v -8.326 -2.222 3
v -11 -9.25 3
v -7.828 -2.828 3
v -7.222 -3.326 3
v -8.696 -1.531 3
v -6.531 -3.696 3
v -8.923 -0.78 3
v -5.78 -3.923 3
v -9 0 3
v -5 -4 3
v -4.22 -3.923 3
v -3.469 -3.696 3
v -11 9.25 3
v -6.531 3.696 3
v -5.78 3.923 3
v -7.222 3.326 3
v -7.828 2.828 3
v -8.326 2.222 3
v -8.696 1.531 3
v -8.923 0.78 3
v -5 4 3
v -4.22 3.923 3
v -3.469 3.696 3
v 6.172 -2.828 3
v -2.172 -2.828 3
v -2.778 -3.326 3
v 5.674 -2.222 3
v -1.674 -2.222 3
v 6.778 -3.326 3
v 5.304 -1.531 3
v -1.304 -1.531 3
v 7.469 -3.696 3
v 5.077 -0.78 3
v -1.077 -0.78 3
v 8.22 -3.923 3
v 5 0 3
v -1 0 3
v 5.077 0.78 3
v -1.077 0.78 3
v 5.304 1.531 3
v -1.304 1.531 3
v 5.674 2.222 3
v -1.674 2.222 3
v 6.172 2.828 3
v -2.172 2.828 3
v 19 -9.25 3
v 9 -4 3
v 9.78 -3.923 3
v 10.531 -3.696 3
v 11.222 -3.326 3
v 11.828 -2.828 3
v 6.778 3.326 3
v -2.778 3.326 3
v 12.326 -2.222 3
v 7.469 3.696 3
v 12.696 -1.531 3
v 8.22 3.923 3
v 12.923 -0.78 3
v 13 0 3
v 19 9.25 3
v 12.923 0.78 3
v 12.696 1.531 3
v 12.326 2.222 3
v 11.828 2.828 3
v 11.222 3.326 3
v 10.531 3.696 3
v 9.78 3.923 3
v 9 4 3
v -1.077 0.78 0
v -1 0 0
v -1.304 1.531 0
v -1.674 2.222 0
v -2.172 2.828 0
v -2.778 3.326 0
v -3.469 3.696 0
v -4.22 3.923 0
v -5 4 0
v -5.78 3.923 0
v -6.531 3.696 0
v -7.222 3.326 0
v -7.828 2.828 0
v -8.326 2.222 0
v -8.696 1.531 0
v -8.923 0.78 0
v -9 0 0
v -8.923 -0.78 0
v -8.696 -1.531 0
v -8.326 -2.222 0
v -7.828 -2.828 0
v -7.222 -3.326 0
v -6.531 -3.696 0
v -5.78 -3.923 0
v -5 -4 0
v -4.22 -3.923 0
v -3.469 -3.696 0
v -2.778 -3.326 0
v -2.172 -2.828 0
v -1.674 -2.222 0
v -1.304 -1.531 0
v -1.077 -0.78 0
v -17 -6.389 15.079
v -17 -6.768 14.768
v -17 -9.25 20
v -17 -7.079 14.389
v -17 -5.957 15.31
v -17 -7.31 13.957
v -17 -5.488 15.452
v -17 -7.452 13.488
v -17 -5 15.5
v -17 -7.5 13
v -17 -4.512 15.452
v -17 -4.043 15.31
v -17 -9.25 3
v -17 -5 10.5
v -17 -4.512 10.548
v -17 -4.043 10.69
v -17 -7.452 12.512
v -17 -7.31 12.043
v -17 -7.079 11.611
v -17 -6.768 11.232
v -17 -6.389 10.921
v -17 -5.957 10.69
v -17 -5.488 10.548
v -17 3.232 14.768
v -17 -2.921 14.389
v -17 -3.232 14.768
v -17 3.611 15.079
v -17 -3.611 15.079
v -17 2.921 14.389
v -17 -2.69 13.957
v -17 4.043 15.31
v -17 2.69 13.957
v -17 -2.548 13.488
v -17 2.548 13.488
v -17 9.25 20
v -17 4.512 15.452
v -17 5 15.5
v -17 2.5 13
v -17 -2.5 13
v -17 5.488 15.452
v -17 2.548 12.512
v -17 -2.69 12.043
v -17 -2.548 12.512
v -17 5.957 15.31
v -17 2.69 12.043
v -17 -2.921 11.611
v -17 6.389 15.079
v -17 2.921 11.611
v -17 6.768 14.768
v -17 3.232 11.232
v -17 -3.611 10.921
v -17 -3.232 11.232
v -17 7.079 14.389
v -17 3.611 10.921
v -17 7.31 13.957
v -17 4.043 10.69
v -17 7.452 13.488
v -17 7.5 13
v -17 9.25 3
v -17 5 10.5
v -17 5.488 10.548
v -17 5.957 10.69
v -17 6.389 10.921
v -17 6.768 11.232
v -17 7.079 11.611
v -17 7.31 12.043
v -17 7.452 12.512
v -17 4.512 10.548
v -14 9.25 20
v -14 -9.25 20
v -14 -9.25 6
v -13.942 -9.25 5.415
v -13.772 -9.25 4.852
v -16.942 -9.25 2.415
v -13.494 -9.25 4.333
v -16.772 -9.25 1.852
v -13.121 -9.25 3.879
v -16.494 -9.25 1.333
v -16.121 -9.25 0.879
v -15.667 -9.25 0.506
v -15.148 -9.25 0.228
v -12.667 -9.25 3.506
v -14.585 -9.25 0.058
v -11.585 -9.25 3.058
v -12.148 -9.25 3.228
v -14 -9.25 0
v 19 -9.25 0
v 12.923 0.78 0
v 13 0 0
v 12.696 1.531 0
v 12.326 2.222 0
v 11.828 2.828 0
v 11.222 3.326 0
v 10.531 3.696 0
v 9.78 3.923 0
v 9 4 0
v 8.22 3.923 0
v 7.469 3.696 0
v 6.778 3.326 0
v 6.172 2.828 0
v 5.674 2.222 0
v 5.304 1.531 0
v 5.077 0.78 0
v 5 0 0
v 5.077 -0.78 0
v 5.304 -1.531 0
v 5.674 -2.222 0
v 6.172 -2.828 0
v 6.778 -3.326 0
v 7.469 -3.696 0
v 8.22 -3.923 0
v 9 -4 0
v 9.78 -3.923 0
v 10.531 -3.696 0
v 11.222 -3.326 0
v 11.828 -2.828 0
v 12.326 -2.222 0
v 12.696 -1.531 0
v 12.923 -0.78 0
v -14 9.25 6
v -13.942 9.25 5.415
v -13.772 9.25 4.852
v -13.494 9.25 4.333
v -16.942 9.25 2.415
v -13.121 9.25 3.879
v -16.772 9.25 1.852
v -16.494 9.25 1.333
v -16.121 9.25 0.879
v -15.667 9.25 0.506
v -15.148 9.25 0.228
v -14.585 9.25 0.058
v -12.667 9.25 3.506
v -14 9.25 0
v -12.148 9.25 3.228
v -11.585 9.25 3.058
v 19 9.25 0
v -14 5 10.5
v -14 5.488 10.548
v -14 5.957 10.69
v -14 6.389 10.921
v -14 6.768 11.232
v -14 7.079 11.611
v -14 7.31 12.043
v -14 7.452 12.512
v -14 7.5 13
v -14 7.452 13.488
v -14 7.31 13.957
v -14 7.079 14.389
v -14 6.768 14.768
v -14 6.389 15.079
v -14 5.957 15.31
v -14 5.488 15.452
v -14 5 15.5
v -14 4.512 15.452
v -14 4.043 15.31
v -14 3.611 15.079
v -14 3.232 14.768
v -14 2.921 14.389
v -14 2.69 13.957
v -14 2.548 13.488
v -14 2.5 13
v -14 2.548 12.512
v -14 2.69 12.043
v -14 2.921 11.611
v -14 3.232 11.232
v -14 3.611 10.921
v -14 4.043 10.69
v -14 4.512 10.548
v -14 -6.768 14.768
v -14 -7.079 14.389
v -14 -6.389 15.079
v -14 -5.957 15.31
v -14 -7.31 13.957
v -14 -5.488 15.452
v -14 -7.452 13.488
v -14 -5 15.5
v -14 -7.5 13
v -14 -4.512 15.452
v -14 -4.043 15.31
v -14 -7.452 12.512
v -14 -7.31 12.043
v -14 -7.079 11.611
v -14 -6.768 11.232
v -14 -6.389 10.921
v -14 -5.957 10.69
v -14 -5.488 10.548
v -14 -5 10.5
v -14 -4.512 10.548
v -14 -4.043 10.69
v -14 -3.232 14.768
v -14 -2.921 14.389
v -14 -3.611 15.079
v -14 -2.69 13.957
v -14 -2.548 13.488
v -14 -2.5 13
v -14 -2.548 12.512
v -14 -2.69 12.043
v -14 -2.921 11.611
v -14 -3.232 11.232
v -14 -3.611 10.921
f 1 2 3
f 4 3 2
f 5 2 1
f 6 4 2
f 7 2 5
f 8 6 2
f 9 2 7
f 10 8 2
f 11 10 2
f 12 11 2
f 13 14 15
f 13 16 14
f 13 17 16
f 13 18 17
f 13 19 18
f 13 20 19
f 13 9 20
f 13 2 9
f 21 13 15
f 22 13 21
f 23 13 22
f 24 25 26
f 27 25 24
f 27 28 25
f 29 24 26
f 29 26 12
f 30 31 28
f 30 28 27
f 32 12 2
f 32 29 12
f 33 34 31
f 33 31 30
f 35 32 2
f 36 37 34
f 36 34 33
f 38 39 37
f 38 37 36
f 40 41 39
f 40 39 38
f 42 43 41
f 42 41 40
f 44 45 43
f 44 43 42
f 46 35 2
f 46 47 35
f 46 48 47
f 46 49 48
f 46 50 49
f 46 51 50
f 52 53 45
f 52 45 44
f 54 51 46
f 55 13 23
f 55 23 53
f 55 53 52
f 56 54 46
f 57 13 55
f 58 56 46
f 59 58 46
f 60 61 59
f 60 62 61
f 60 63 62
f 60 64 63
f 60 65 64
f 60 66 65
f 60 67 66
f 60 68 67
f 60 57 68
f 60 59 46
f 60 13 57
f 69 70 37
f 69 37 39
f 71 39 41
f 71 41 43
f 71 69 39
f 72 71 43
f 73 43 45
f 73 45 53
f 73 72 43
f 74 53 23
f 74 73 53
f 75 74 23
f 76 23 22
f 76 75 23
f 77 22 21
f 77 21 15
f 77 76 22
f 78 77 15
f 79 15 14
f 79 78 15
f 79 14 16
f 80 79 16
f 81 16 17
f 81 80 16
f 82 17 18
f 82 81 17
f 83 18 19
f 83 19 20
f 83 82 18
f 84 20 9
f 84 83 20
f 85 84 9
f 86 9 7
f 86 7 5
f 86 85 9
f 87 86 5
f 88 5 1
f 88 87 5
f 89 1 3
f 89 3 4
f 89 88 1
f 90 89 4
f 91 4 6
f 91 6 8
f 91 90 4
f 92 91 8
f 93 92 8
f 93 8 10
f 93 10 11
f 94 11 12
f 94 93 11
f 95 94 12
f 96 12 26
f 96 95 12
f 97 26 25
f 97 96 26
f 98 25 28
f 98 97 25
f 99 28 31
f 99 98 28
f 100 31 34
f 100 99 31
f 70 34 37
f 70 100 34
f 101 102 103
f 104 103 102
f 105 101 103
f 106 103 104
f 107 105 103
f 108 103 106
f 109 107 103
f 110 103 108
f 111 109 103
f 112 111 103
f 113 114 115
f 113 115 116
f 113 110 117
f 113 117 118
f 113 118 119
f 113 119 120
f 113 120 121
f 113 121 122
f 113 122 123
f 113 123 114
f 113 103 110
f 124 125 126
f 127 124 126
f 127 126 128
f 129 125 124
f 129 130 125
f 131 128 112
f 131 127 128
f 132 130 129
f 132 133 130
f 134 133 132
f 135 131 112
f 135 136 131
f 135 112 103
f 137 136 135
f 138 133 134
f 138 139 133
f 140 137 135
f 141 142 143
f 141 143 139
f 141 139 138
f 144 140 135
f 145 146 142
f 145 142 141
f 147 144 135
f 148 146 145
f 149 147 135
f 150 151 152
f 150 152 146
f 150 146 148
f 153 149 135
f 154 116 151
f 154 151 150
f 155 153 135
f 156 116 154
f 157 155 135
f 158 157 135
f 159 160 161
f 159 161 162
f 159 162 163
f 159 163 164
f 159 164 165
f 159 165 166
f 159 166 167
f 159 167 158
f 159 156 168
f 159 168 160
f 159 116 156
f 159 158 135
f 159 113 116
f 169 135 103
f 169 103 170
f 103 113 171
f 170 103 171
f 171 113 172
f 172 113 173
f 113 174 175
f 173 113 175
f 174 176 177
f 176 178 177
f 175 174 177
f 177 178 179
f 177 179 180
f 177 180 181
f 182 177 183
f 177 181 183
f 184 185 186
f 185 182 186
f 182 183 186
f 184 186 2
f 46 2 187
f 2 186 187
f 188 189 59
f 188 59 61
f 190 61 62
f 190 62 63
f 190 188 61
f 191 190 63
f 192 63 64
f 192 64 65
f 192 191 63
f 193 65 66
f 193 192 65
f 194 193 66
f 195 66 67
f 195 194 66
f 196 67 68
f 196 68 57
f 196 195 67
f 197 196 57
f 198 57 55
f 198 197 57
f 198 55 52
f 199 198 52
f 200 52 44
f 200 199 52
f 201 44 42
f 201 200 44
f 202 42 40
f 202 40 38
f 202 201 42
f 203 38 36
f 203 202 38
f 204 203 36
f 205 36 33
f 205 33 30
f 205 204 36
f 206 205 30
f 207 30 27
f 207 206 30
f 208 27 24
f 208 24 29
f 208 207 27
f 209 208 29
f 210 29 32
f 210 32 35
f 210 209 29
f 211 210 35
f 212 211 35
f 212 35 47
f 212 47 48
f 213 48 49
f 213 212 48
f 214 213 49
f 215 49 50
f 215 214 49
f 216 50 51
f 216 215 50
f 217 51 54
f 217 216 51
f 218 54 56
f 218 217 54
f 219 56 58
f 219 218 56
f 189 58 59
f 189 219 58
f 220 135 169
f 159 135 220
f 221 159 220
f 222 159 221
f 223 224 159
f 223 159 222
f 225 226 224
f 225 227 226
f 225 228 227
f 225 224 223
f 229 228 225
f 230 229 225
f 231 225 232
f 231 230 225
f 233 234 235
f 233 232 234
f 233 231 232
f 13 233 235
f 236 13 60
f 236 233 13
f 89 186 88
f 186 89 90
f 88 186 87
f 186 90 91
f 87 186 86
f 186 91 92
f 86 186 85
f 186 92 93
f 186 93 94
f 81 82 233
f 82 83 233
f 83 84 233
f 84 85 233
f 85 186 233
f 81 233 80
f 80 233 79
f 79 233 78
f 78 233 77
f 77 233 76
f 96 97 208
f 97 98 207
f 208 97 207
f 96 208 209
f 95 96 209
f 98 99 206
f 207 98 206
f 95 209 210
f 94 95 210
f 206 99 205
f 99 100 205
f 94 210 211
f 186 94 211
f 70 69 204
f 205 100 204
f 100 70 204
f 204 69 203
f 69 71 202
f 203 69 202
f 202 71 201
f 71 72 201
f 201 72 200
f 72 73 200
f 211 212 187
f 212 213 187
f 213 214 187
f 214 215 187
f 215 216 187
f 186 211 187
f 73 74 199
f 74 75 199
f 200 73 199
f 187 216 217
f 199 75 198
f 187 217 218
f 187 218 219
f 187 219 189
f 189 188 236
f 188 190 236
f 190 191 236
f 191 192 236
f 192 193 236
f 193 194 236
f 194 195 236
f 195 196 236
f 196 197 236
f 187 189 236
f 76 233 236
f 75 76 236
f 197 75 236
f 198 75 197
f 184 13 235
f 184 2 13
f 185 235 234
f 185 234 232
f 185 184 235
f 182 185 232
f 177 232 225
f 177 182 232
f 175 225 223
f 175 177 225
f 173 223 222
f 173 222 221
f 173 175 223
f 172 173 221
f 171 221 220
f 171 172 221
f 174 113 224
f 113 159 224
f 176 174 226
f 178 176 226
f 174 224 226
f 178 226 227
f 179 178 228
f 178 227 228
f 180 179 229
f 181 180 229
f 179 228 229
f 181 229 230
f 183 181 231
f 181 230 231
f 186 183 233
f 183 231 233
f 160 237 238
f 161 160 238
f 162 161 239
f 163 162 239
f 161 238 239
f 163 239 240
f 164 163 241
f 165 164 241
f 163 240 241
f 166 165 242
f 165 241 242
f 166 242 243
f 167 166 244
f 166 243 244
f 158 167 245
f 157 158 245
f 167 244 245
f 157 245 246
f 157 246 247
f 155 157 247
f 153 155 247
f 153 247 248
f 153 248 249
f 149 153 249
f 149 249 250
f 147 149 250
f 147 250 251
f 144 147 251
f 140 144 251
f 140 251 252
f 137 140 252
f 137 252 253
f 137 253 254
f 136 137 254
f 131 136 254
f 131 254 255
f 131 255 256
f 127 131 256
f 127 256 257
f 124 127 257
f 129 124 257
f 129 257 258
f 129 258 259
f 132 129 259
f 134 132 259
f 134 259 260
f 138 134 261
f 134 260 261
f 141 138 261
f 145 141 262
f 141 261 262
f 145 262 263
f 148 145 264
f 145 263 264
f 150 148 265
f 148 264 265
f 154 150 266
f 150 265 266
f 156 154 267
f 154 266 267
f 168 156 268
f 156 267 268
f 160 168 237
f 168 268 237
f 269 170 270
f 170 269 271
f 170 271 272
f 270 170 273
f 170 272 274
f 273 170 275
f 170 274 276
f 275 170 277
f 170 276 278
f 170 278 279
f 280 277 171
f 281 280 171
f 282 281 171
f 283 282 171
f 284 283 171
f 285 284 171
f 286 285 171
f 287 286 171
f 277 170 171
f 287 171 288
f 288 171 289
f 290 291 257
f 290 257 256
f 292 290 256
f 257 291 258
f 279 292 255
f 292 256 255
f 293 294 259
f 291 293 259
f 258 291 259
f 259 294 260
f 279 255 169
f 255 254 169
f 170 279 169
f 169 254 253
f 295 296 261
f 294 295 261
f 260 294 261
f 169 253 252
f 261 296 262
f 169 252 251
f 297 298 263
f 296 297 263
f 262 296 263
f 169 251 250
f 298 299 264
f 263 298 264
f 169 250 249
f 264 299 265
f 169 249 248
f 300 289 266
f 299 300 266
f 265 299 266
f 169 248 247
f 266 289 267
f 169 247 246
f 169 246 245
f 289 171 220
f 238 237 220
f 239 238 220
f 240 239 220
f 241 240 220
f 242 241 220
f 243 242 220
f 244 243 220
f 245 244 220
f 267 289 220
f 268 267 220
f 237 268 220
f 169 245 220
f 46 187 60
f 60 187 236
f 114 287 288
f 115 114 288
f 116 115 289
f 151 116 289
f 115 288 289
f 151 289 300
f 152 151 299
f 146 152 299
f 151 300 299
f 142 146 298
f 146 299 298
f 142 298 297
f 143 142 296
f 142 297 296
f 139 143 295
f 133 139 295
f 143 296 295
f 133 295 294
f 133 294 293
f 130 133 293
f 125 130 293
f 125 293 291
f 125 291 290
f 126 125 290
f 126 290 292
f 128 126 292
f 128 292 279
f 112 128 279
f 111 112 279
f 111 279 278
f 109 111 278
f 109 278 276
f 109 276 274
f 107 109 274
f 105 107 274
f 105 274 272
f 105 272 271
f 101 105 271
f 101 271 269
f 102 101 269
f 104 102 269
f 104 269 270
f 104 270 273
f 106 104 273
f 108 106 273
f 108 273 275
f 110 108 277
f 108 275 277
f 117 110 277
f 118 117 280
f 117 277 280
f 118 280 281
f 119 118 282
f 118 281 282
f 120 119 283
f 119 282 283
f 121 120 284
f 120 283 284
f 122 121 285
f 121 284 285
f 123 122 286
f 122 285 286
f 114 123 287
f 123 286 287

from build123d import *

# Parameters (mm, degrees)
SKETCH1_W           = 36
SKETCH1_H           = 18.5
SKETCH1_R           = 4
BOSS_EXTRUDE1_DEPTH = 3
SKETCH1_3_W         = 3
SKETCH1_3_H         = 18.5
BOSS_EXTRUDE2_DEPTH = 20
FILLET1_R           = 3
SKETCH2_R           = 2.5
CUT_EXTRUDE1_DEPTH  = 40.680757301


with BuildPart() as part:
    # Sketch1 → Boss-Extrude1 (new body)
    with BuildSketch(Plane.XY):
        with Locations((1, 0)):
            Rectangle(SKETCH1_W, SKETCH1_H)
        with Locations((9, 0)):
            Circle(SKETCH1_R, mode=Mode.SUBTRACT)
        with Locations((-5, 0)):
            Circle(SKETCH1_R, mode=Mode.SUBTRACT)
    extrude(amount=BOSS_EXTRUDE1_DEPTH)

    # Sketch1<3> → Boss-Extrude2 (add)
    with BuildSketch(Plane.XY):
        with Locations((-15.5, 0)):
            Rectangle(SKETCH1_3_W, SKETCH1_3_H)
    extrude(amount=BOSS_EXTRUDE2_DEPTH)

    # Fillet1
    fillet1_edges = [part.edges().sort_by_distance(p)[0] for p in [
        (-17, 0, 0),
        (-14, 0, 3),
    ]]
    fillet(fillet1_edges, radius=FILLET1_R)

    # Sketch2 → Cut-Extrude1 (cut, through all)
    with BuildSketch(Plane(origin=(-14, 0, 0), x_dir=(0, 0, -1), z_dir=(1, 0, 0))):
        with Locations((-13, 5)):
            Circle(SKETCH2_R)
        with Locations((-13, -5)):
            Circle(SKETCH2_R)
    extrude(amount=-CUT_EXTRUDE1_DEPTH, mode=Mode.SUBTRACT)


solid = part.part
